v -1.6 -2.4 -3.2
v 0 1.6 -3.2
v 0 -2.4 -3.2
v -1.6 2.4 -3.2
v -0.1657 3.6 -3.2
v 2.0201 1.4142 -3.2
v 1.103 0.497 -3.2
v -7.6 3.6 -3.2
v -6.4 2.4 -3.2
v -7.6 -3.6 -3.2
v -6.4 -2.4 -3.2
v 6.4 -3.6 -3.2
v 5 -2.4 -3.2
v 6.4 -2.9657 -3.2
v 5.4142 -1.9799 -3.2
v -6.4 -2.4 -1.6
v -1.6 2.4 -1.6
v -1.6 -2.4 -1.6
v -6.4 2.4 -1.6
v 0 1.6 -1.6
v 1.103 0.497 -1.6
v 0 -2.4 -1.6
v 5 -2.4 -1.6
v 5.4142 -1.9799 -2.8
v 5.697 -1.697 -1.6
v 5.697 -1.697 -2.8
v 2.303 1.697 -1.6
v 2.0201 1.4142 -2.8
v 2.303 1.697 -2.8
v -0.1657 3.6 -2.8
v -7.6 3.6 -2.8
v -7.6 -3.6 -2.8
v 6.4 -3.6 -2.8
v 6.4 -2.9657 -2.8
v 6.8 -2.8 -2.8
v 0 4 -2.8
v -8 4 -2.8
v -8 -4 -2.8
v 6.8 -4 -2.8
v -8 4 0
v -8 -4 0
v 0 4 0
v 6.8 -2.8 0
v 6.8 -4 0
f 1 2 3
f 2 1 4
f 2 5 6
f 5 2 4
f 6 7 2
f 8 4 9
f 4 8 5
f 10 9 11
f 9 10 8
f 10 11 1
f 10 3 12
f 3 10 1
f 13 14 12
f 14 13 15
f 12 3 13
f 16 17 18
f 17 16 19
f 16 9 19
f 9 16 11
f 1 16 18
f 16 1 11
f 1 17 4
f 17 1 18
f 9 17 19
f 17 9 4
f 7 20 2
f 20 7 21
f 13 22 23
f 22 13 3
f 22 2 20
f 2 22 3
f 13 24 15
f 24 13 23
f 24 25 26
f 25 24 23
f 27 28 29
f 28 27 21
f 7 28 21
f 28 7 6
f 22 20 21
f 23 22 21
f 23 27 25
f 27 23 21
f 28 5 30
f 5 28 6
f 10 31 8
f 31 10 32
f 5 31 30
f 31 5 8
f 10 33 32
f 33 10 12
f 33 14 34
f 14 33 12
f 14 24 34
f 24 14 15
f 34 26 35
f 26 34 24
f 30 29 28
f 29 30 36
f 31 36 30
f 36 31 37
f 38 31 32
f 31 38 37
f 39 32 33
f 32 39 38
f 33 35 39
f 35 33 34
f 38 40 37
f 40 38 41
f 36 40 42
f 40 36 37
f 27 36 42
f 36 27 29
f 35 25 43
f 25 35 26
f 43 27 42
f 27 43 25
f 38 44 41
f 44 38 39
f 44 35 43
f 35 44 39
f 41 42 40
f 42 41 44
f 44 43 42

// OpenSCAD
// file: ../p/rect3.scad
use <../lib.scad>
function ldraw_lib__rect3() = [
// 0 Rectangle with 3 Edges
// 0 Name: rect3.dat
// 0 Author: Mark Kennedy [mkennedy]
// 0 !LDRAW_ORG Primitive UPDATE 2010-01
// 0 !LICENSE Licensed under CC BY 4.0 : see CAreadme.txt
// 
// 0 BFC CERTIFY CCW
  [0,"BFC","CERTIFY"],
  [0,"BFC","CCW"],
// 
// 0 !HISTORY 2003-08-01 [PTadmin] Official Update 2003-02
// 0 !HISTORY 2007-06-24 [PTadmin] Header formatted for Contributor Agreement
// 0 !HISTORY 2008-07-01 [PTadmin] Official Update 2008-01
// 0 !HISTORY 2010-01-17 [mikeheide] Change winding to CCW
// 0 !HISTORY 2010-04-05 [PTadmin] Official Update 2010-01
// 
// 
// 2 24 1 0 1 -1 0 1
  [2,24,1,0,1,-1,0,1],
// 2 24 1 0 1 1 0 -1
  [2,24,1,0,1,1,0,-1],
// 2 24 -1 0 1 -1 0 -1
  [2,24,-1,0,1,-1,0,-1],
// 4 16 -1 0 1 -1 0 -1 1 0 -1 1 0 1
  [4,16,-1,0,1,-1,0,-1,1,0,-1,1,0,1],
// 0 //
];
module ldraw_lib__rect3(step=0, col=false, unit=2/5, alt=false, line=0.2, solid=!$preview)
    makepoly(ldraw_lib__rect3(), step=step, col=col, unit=unit, alt=alt, line=line, solid=solid);
ldraw_lib__rect3(line=0.2);
// file: ../p/rect.scad
use <../lib.scad>
function ldraw_lib__rect() = [
// 0 Rectangle
// 0 Name: rect.dat
// 0 Author: James Jessiman
// 0 !LDRAW_ORG Primitive UPDATE 2010-01
// 0 !LICENSE Licensed under CC BY 4.0 : see CAreadme.txt
// 
// 0 BFC CERTIFY CCW
  [0,"BFC","CERTIFY"],
  [0,"BFC","CCW"],
// 
// 0 !HISTORY 2002-04-05 [hafhead] Added BFC statement
// 0 !HISTORY 2002-04-25 [PTadmin] Official Update 2002-02
// 0 !HISTORY 2007-06-24 [PTadmin] Header formatted for Contributor Agreement
// 0 !HISTORY 2008-07-01 [PTadmin] Official Update 2008-01
// 0 !HISTORY 2010-01-17 [mikeheide] changed winding to CCW
// 0 !HISTORY 2010-04-05 [PTadmin] Official Update 2010-01
// 
// 
// 2 24 1 0 1 -1 0 1
  [2,24,1,0,1,-1,0,1],
// 2 24 -1 0 1 -1 0 -1
  [2,24,-1,0,1,-1,0,-1],
// 2 24 -1 0 -1 1 0 -1
  [2,24,-1,0,-1,1,0,-1],
// 2 24 1 0 -1 1 0 1
  [2,24,1,0,-1,1,0,1],
// 4 16 -1 0 1 -1 0 -1 1 0 -1 1 0 1
  [4,16,-1,0,1,-1,0,-1,1,0,-1,1,0,1],
// 0
];
module ldraw_lib__rect(step=0, col=false, unit=2/5, alt=false, line=0.2, solid=!$preview)
    makepoly(ldraw_lib__rect(), step=step, col=col, unit=unit, alt=alt, line=line, solid=solid);
ldraw_lib__rect(line=0.2);
// file: ../p/box5.scad
use <../lib.scad>
function ldraw_lib__box5() = [
// 0 Box with 5 Faces and All Edges
// 0 Name: box5.dat
// 0 Author: James Jessiman
// 0 !LDRAW_ORG Primitive UPDATE 2012-01
// 0 !LICENSE Licensed under CC BY 4.0 : see CAreadme.txt
// 
// 0 BFC CERTIFY CCW
  [0,"BFC","CERTIFY"],
  [0,"BFC","CCW"],
// 
// 0 !HISTORY 2002-04-03 [sbliss] Modified for BFC compliance
// 0 !HISTORY 2002-04-25 [PTadmin] Official Update 2002-02
// 0 !HISTORY 2007-06-24 [PTadmin] Header formatted for Contributor Agreement
// 0 !HISTORY 2008-07-01 [PTadmin] Official Update 2008-01
// 0 !HISTORY 2012-02-16 [Philo] Changed to CCW
// 0 !HISTORY 2012-03-30 [PTadmin] Official Update 2012-01
// 
// 
// 2 24 1 1 1 -1 1 1
  [2,24,1,1,1,-1,1,1],
// 2 24 -1 1 1 -1 1 -1
  [2,24,-1,1,1,-1,1,-1],
// 2 24 -1 1 -1 1 1 -1
  [2,24,-1,1,-1,1,1,-1],
// 2 24 1 1 -1 1 1 1
  [2,24,1,1,-1,1,1,1],
// 2 24 1 0 1 -1 0 1
  [2,24,1,0,1,-1,0,1],
// 2 24 -1 0 1 -1 0 -1
  [2,24,-1,0,1,-1,0,-1],
// 2 24 -1 0 -1 1 0 -1
  [2,24,-1,0,-1,1,0,-1],
// 2 24 1 0 -1 1 0 1
  [2,24,1,0,-1,1,0,1],
// 2 24 1 0 1 1 1 1
  [2,24,1,0,1,1,1,1],
// 2 24 -1 0 1 -1 1 1
  [2,24,-1,0,1,-1,1,1],
// 2 24 1 0 -1 1 1 -1
  [2,24,1,0,-1,1,1,-1],
// 2 24 -1 0 -1 -1 1 -1
  [2,24,-1,0,-1,-1,1,-1],
// 4 16 -1 1 1 1 1 1 1 1 -1 -1 1 -1
  [4,16,-1,1,1,1,1,1,1,1,-1,-1,1,-1],
// 4 16 -1 1 1 -1 0 1 1 0 1 1 1 1
  [4,16,-1,1,1,-1,0,1,1,0,1,1,1,1],
// 4 16 -1 1 -1 -1 0 -1 -1 0 1 -1 1 1
  [4,16,-1,1,-1,-1,0,-1,-1,0,1,-1,1,1],
// 4 16 1 1 -1 1 0 -1 -1 0 -1 -1 1 -1
  [4,16,1,1,-1,1,0,-1,-1,0,-1,-1,1,-1],
// 4 16 1 1 1 1 0 1 1 0 -1 1 1 -1
  [4,16,1,1,1,1,0,1,1,0,-1,1,1,-1],
];
module ldraw_lib__box5(step=0, col=false, unit=2/5, alt=false, line=0.2, solid=!$preview)
    makepoly(ldraw_lib__box5(), step=step, col=col, unit=unit, alt=alt, line=line, solid=solid);
ldraw_lib__box5(line=0.2);
// file: ../p/box2-7.scad
use <../lib.scad>
function ldraw_lib__box2_7() = [
// 0 Box with  2 Faces without  7 Edges
// 0 Name: box2-7.dat
// 0 Author: Willy Tschager [Holly-Wood]
// 0 !LDRAW_ORG Primitive UPDATE 2024-01
// 0 !LICENSE Licensed under CC BY 4.0 : see CAreadme.txt
// 
// 0 BFC CERTIFY CCW
  [0,"BFC","CERTIFY"],
  [0,"BFC","CCW"],
// 
// 0 !HISTORY 2009-05-02 [PTadmin] Official Update 2009-01
// 0 !HISTORY 2024-01-02 [Holly-Wood] Complete re-write, original by guyvivan
// 0 !HISTORY 2024-01-29 [OrionP] Official Update 2024-01
// 
// 2 24 -1 1 -1 -1 1 1
  [2,24,-1,1,-1,-1,1,1],
// 2 24 1 1 1 1 1 -1
  [2,24,1,1,1,1,1,-1],
// 4 16 -1 1 1 1 1 1 1 1 -1 -1 1 -1
  [4,16,-1,1,1,1,1,1,1,1,-1,-1,1,-1],
// 
// 2 24 -1 1 1 -1 -1 1
  [2,24,-1,1,1,-1,-1,1],
// 2 24 1 1 1 1 -1 1
  [2,24,1,1,1,1,-1,1],
// 4 16 1 -1 1 1 1 1 -1 1 1 -1 -1 1
  [4,16,1,-1,1,1,1,1,-1,1,1,-1,-1,1],
// 
// 2 24 -1 1 1 1 1 1
  [2,24,-1,1,1,1,1,1],
];
module ldraw_lib__box2_7(step=0, col=false, unit=2/5, alt=false, line=0.2, solid=!$preview)
    makepoly(ldraw_lib__box2_7(), step=step, col=col, unit=unit, alt=alt, line=line, solid=solid);
ldraw_lib__box2_7(line=0.2);
// file: ../p/box2-5.scad
use <../lib.scad>
function ldraw_lib__box2_5() = [
// 0 Box with 2 Faces without 5 Edges
// 0 Name: box2-5.dat
// 0 Author: Steffen [Steffen]
// 0 !LDRAW_ORG Primitive UPDATE 2003-03
// 0 !LICENSE Licensed under CC BY 4.0 : see CAreadme.txt
// 
// 0 BFC CERTIFY CCW
  [0,"BFC","CERTIFY"],
  [0,"BFC","CCW"],
// 
// 0 !HISTORY 2003-12-19 [PTadmin] Official Update 2003-03
// 0 !HISTORY 2007-06-24 [PTadmin] Header formatted for Contributor Agreement
// 0 !HISTORY 2008-07-01 [PTadmin] Official Update 2008-01
// 
// 
// 2 24 1 1 1 -1 1 1
  [2,24,1,1,1,-1,1,1],
// 2 24 1 1 -1 -1 1 -1
  [2,24,1,1,-1,-1,1,-1],
// 2 24 1 -1 1 -1 -1 1
  [2,24,1,-1,1,-1,-1,1],
// 2 24 -1 -1 1 -1 1 1
  [2,24,-1,-1,1,-1,1,1],
// 2 24 1 -1 1 1 1 1
  [2,24,1,-1,1,1,1,1],
// 2 24 -1 1 -1 -1 1 1
  [2,24,-1,1,-1,-1,1,1],
// 2 24 1 1 -1 1 1 1
  [2,24,1,1,-1,1,1,1],
// 4 16 1 1 1 1 1 -1 -1 1 -1 -1 1 1
  [4,16,1,1,1,1,1,-1,-1,1,-1,-1,1,1],
// 4 16 1 1 1 -1 1 1 -1 -1 1 1 -1 1
  [4,16,1,1,1,-1,1,1,-1,-1,1,1,-1,1],
// 0
];
module ldraw_lib__box2_5(step=0, col=false, unit=2/5, alt=false, line=0.2, solid=!$preview)
    makepoly(ldraw_lib__box2_5(), step=step, col=col, unit=unit, alt=alt, line=line, solid=solid);
ldraw_lib__box2_5(line=0.2);
// file: s/5092s01.scad
use <../../lib.scad>
use <../../p/box2-5.scad>
use <../../p/box2-7.scad>
use <../../p/box5.scad>
use <../../p/rect.scad>
use <../../p/rect3.scad>
function ldraw_lib__s__5092s01() = [
// 0 ~Tile  1 x  2 Cut Right 45 Degree without Patternable Surfaces
// 0 Name: s\5092s01.dat
// 0 Author: Gerald Lasser [GeraldLasser]
// 0 !LDRAW_ORG Subpart UPDATE 2025-03
// 0 !LICENSE Licensed under CC BY 4.0 : see CAreadme.txt
// 
// 0 BFC CERTIFY CCW
  [0,"BFC","CERTIFY"],
  [0,"BFC","CCW"],
// 
// 0 !HISTORY 2025-03-30 [OrionP] Official Update 2025-03
// 
// 0 // Bottom
// 4 16 -4 8 6 0 8 6 0 8 -4 -4 8 -6
  [4,16,-4,8,6,0,8,6,0,8,-4,-4,8,-6],
// 4 16 5.0503 8 -3.5355 -.4142 8 -9 -4 8 -6 0 8 -4
  [4,16,5.0503,8,-3.5355,-.4142,8,-9,-4,8,-6,0,8,-4],
// 3 16 0 8 -4 2.7574 8 -1.2426 5.0503 8 -3.5355
  [3,16,0,8,-4,2.7574,8,-1.2426,5.0503,8,-3.5355],
// 4 16 -19 8 -9 -16 8 -6 -4 8 -6 -.4142 8 -9
  [4,16,-19,8,-9,-16,8,-6,-4,8,-6,-.4142,8,-9],
// 4 16 -19 8 9 -16 8 6 -16 8 -6 -19 8 -9
  [4,16,-19,8,9,-16,8,6,-16,8,-6,-19,8,-9],
// 3 16 -4 8 6 -16 8 6 -19 8 9
  [3,16,-4,8,6,-16,8,6,-19,8,9],
// 4 16 -19 8 9 16 8 9 0 8 6 -4 8 6
  [4,16,-19,8,9,16,8,9,0,8,6,-4,8,6],
// 4 16 16 8 7.4142 13.5355 8 4.9497 12.5 8 6 16 8 9
  [4,16,16,8,7.4142,13.5355,8,4.9497,12.5,8,6,16,8,9],
// 3 16 12.5 8 6 0 8 6 16 8 9
  [3,16,12.5,8,6,0,8,6,16,8,9],
// 0 BFC INVERTNEXT
  [0,"BFC","INVERTNEXT"],
// 1 16 -10 8 0 0 0 -6 0 -4 0 -6 0 0 box5.dat
  [1,16,-10,8,0,0,0,-6,0,-4,0,-6,0,0, ldraw_lib__box5()],
// 1 16 1.3787 6 -2.6213 0 0 1.3787 -2 0 0 0 -1 1.3787 rect3.dat
  [1,16,1.3787,6,-2.6213,0,0,1.3787,-2,0,0,0,-1,1.3787, ldraw_lib__rect3()],
// 0 BFC INVERTNEXT
  [0,"BFC","INVERTNEXT"],
// 1 16 6.25 6 1 0 0 -6.25 -2 0 0 0 5 0 box2-5.dat
  [1,16,6.25,6,1,0,0,-6.25,-2,0,0,0,5,0, ldraw_lib__box2_5()],
// 4 16 13.5355 8 4.9497 13.5355 7 4.9497 12.5 4 6 12.5 8 6
  [4,16,13.5355,8,4.9497,13.5355,7,4.9497,12.5,4,6,12.5,8,6],
// 4 16 12.5 4 6 13.5355 7 4.9497 14.2426 7 4.2426 14.2426 4 4.2426
  [4,16,12.5,4,6,13.5355,7,4.9497,14.2426,7,4.2426,14.2426,4,4.2426],
// 4 16 5.7574 7 -4.2426 5.0503 7 -3.5355 2.7574 4 -1.2426 5.7574 4 -4.2426
  [4,16,5.7574,7,-4.2426,5.0503,7,-3.5355,2.7574,4,-1.2426,5.7574,4,-4.2426],
// 4 16 2.7574 4 -1.2426 5.0503 7 -3.5355 5.0503 8 -3.5355 2.7574 8 -1.2426
  [4,16,2.7574,4,-1.2426,5.0503,7,-3.5355,5.0503,8,-3.5355,2.7574,8,-1.2426],
// 2 24 13.5355 7 4.9497 14.2426 7 4.2426
  [2,24,13.5355,7,4.9497,14.2426,7,4.2426],
// 2 24 5.0503 7 -3.5355 5.7574 7 -4.2426
  [2,24,5.0503,7,-3.5355,5.7574,7,-4.2426],
// 2 24 13.5355 8 4.9497 12.5 8 6
  [2,24,13.5355,8,4.9497,12.5,8,6],
// 2 24 2.7574 8 -1.2426 5.0503 8 -3.5355
  [2,24,2.7574,8,-1.2426,5.0503,8,-3.5355],
// 3 16 2.7574 4 -1.2426 0 4 -4 0 4 6
  [3,16,2.7574,4,-1.2426,0,4,-4,0,4,6],
// 3 16 2.7574 4 -1.2426 0 4 6 12.5 4 6
  [3,16,2.7574,4,-1.2426,0,4,6,12.5,4,6],
// 4 16 2.7574 4 -1.2426 12.5 4 6 14.2426 4 4.2426 5.7574 4 -4.2426
  [4,16,2.7574,4,-1.2426,12.5,4,6,14.2426,4,4.2426,5.7574,4,-4.2426],
// 2 24 12.5 4 6 14.2426 4 4.2426
  [2,24,12.5,4,6,14.2426,4,4.2426],
// 2 24 14.2426 4 4.2426 5.7574 4 -4.2426
  [2,24,14.2426,4,4.2426,5.7574,4,-4.2426],
// 2 24 5.7574 4 -4.2426 2.7574 4 -1.2426
  [2,24,5.7574,4,-4.2426,2.7574,4,-1.2426],
// 
// 0 // Lip
// 1 16 2.318 7.5 -6.2678 2.73225 -1 0 0 0 .5 2.73225 0 0 rect.dat
  [1,16,2.318,7.5,-6.2678,2.73225,-1,0,0,0,.5,2.73225,0,0, ldraw_lib__rect()],
// 1 16 -9.7071 7.5 0 0 -9.2929 0 .5 0 0 0 0 -9 box2-7.dat
  [1,16,-9.7071,7.5,0,0,-9.2929,0,.5,0,0,0,0,-9, ldraw_lib__box2_7()],
// 1 16 -1.5 7.5 8.2071 0 0 17.5 -.5 0 0 0 .7929 0 box2-5.dat
  [1,16,-1.5,7.5,8.2071,0,0,17.5,-.5,0,0,0,.7929,0, ldraw_lib__box2_5()],
// 1 16 14.76775 7.5 6.18195 0 0 -1.23225 -.5 0 0 0 1 -1.23225 rect3.dat
  [1,16,14.76775,7.5,6.18195,0,0,-1.23225,-.5,0,0,0,1,-1.23225, ldraw_lib__rect3()],
// 4 16 13.5355 7 4.9497 16 7 7.4142 17 7 7 14.2426 7 4.2426
  [4,16,13.5355,7,4.9497,16,7,7.4142,17,7,7,14.2426,7,4.2426],
// 4 16 -.4142 7 -9 5.0503 7 -3.5355 5.7574 7 -4.2426 0 7 -10
  [4,16,-.4142,7,-9,5.0503,7,-3.5355,5.7574,7,-4.2426,0,7,-10],
// 4 16 -.4142 7 -9 0 7 -10 -20 7 -10 -19 7 -9
  [4,16,-.4142,7,-9,0,7,-10,-20,7,-10,-19,7,-9],
// 4 16 -19 7 -9 -20 7 -10 -20 7 10 -19 7 9
  [4,16,-19,7,-9,-20,7,-10,-20,7,10,-19,7,9],
// 4 16 -19 7 9 -20 7 10 17 7 10 16 7 9
  [4,16,-19,7,9,-20,7,10,17,7,10,16,7,9],
// 4 16 16 7 9 17 7 10 17 7 7 16 7 7.4142
  [4,16,16,7,9,17,7,10,17,7,7,16,7,7.4142],
// 
// 0 // Outside
// 1 16 -10 3.5 0 0 -10 0 3.5 0 0 0 0 -10 box2-5.dat
  [1,16,-10,3.5,0,0,-10,0,3.5,0,0,0,0,-10, ldraw_lib__box2_5()],
// 4 16 0 0 -10 0 7 -10 5.7574 7 -4.2426 5.7574 4 -4.2426
  [4,16,0,0,-10,0,7,-10,5.7574,7,-4.2426,5.7574,4,-4.2426],
// 4 16 14.2426 4 4.2426 14.2426 7 4.2426 17 7 7 17 0 7
  [4,16,14.2426,4,4.2426,14.2426,7,4.2426,17,7,7,17,0,7],
// 4 16 5.7574 4 -4.2426 14.2426 4 4.2426 17 0 7 0 0 -10
  [4,16,5.7574,4,-4.2426,14.2426,4,4.2426,17,0,7,0,0,-10],
// 2 24 14.2426 7 4.2426 14.2426 4 4.2426
  [2,24,14.2426,7,4.2426,14.2426,4,4.2426],
// 2 24 5.7574 4 -4.2426 5.7574 7 -4.2426
  [2,24,5.7574,4,-4.2426,5.7574,7,-4.2426],
// 2 24 17 7 7 14.2426 7 4.2426
  [2,24,17,7,7,14.2426,7,4.2426],
// 2 24 5.7574 7 -4.2426 0 7 -10
  [2,24,5.7574,7,-4.2426,0,7,-10],
// 2 24 0 0 -10 17 0 7
  [2,24,0,0,-10,17,0,7],
// 2 24 17 0 7 17 7 7
  [2,24,17,0,7,17,7,7],
// 1 16 -1.5 3.5 8.5 0 0 18.5 -3.5 0 0 0 1.5 0 box2-7.dat
  [1,16,-1.5,3.5,8.5,0,0,18.5,-3.5,0,0,0,1.5,0, ldraw_lib__box2_7()],
];
module ldraw_lib__s__5092s01(step=0, col=false, unit=2/5, alt=false, line=0.2, solid=!$preview)
    makepoly(ldraw_lib__s__5092s01(), step=step, col=col, unit=unit, alt=alt, line=line, solid=solid);
ldraw_lib__s__5092s01(line=0.2);
// main file
use <../lib.scad>
use <s/5092s01.scad>
function ldraw_lib__5091() = [
// 0 Tile  1 x  2 Cut Left 45 Degree
// 0 Name: 5091.dat
// 0 Author: Gerald Lasser [GeraldLasser]
// 0 !LDRAW_ORG Part UPDATE 2025-03
// 0 !LICENSE Licensed under CC BY 4.0 : see CAreadme.txt
// 
// 0 BFC CERTIFY CCW
  [0,"BFC","CERTIFY"],
  [0,"BFC","CCW"],
// 
// 0 !HISTORY 2025-03-30 [OrionP] Official Update 2025-03
// 
// 1 16 0 0 0 1 0 0 0 1 0 0 0 -1 s\5092s01.dat
  [1,16,0,0,0,1,0,0,0,1,0,0,0,-1, ldraw_lib__s__5092s01()],
// 
// 4 16 0 0 10 -20 0 10 -20 0 -10 17 0 -10
  [4,16,0,0,10,-20,0,10,-20,0,-10,17,0,-10],
// 3 16 17 0 -10 17 0 -7 0 0 10
  [3,16,17,0,-10,17,0,-7,0,0,10],
];
module ldraw_lib__5091(step=0, col=false, unit=2/5, alt=false, line=0.2, solid=!$preview)
    makepoly(ldraw_lib__5091(), step=step, col=col, unit=unit, alt=alt, line=line, solid=solid);
ldraw_lib__5091(line=0.2);
